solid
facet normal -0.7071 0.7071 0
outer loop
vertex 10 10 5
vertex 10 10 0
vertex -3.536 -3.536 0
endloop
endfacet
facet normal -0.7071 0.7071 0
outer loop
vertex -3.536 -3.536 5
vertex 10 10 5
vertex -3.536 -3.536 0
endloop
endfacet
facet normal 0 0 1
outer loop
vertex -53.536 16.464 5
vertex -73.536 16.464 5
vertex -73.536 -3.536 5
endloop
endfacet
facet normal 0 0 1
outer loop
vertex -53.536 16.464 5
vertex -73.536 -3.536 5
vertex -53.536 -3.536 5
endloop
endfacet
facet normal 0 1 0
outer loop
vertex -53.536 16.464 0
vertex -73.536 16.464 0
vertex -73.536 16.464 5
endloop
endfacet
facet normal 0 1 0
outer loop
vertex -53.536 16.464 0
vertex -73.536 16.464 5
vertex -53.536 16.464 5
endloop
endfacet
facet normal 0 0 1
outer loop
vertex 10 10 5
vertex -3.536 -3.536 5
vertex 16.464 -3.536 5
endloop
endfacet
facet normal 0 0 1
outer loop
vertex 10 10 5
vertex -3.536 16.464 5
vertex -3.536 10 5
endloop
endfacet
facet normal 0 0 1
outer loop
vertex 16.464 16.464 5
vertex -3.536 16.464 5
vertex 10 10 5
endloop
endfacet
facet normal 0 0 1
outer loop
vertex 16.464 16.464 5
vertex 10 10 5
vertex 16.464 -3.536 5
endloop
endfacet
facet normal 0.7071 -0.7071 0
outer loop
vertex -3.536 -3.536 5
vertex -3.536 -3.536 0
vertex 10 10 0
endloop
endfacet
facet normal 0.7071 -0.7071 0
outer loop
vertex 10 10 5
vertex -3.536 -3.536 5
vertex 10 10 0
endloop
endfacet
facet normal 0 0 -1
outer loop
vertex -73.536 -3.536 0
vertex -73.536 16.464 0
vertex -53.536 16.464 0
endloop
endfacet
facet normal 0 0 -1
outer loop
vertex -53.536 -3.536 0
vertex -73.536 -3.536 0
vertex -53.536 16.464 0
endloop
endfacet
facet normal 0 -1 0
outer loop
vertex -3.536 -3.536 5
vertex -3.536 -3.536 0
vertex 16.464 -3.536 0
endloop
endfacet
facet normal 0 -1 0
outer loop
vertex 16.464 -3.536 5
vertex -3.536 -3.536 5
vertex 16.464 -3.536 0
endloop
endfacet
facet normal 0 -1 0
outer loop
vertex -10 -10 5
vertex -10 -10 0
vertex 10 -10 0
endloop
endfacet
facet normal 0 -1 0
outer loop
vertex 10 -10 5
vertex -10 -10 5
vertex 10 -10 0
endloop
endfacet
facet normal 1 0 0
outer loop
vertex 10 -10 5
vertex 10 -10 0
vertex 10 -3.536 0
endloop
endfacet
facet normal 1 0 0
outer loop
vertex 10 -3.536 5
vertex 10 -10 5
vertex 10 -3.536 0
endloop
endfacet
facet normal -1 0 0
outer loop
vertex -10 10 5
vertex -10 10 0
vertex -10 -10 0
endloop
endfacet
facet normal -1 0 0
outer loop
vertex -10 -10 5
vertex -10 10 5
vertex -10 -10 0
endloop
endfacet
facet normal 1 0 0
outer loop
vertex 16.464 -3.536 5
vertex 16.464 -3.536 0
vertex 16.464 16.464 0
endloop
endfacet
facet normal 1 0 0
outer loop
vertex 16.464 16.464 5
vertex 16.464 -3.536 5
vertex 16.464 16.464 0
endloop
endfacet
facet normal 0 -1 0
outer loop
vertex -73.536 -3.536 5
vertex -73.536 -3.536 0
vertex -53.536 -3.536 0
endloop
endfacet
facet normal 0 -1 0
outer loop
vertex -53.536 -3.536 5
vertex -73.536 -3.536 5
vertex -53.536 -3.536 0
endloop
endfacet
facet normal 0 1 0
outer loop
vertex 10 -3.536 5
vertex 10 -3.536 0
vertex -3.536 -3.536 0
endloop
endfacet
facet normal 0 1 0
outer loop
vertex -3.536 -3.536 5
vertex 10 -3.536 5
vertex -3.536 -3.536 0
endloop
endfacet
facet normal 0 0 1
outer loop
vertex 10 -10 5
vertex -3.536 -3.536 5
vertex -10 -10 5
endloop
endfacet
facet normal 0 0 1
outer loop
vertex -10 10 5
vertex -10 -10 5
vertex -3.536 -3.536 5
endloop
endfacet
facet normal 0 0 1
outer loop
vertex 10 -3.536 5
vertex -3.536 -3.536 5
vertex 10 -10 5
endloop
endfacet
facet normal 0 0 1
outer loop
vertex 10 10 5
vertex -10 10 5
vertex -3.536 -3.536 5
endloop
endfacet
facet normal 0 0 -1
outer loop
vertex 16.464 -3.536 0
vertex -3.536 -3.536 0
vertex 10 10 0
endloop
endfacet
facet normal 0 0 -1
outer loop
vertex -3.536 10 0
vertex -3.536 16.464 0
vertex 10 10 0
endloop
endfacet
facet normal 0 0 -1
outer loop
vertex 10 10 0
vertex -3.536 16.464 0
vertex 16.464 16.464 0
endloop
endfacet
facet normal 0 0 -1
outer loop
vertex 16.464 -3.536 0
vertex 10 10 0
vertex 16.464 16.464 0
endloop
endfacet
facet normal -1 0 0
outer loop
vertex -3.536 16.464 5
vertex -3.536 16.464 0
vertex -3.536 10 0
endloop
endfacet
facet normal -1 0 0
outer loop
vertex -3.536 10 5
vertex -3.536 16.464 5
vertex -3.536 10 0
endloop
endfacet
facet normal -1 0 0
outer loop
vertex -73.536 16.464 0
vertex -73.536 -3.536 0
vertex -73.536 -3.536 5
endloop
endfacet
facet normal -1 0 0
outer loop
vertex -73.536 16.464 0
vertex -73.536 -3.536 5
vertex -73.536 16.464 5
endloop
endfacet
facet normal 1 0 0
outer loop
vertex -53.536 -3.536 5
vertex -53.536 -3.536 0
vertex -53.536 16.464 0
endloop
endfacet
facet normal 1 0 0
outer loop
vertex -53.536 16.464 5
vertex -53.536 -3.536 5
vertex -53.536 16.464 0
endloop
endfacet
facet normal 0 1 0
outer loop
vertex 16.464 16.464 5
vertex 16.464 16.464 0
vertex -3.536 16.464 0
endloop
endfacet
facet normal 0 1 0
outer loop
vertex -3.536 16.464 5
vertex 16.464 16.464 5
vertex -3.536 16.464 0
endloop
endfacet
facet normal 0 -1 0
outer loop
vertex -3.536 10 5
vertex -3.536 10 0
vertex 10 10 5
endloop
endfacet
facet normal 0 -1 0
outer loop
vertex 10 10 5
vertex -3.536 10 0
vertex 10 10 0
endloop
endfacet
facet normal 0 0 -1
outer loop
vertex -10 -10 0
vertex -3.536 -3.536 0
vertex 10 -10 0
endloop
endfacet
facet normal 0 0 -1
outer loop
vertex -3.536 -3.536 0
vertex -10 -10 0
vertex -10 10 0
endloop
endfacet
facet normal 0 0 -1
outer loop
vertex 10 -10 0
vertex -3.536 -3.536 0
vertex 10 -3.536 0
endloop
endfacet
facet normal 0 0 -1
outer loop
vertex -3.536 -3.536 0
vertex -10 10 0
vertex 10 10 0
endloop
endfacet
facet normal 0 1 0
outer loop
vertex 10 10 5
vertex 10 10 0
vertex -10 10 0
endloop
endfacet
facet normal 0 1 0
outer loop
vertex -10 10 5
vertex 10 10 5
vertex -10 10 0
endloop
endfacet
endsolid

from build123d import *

# Parameters (mm, degrees)
F1_DEPTH = 5
F2_DEPTH = 5
F0_W     = 20
F0_H     = 20
F3_DEPTH = 5


with BuildPart() as f1:
    # F0 (on Top) → F1 (new body)
    with BuildSketch(Plane.XY):
        Polygon((-10, -10), (10, -10), (10, -3.535534), (-3.535534, -3.535534), (-3.535534, 10), (-10, 10), align=None)
        Polygon((-3.535534, -3.535534), (10, 10), (-3.535534, 10), align=None)
    extrude(amount=F1_DEPTH)


with BuildPart() as f2:
    # F0 (on Top) → F2 (new body)
    with BuildSketch(Plane.XY):
        Polygon((-3.535534, -3.535534), (10, -3.535534), (10, 10), align=None)
        Polygon((10, 10), (10, -3.535534), (16.464466, -3.535534), (16.464466, 16.464466), (-3.535534, 16.464466), (-3.535534, 10), align=None)
    extrude(amount=F2_DEPTH)


with BuildPart() as f3:
    # F0 (on Top) → F3 (new body)
    with BuildSketch(Plane.XY):
        with Locations((-63.535534, 6.464466)):
            Rectangle(F0_W, F0_H)
    extrude(amount=F3_DEPTH)


solid = Compound([f1.part, f2.part, f3.part])
